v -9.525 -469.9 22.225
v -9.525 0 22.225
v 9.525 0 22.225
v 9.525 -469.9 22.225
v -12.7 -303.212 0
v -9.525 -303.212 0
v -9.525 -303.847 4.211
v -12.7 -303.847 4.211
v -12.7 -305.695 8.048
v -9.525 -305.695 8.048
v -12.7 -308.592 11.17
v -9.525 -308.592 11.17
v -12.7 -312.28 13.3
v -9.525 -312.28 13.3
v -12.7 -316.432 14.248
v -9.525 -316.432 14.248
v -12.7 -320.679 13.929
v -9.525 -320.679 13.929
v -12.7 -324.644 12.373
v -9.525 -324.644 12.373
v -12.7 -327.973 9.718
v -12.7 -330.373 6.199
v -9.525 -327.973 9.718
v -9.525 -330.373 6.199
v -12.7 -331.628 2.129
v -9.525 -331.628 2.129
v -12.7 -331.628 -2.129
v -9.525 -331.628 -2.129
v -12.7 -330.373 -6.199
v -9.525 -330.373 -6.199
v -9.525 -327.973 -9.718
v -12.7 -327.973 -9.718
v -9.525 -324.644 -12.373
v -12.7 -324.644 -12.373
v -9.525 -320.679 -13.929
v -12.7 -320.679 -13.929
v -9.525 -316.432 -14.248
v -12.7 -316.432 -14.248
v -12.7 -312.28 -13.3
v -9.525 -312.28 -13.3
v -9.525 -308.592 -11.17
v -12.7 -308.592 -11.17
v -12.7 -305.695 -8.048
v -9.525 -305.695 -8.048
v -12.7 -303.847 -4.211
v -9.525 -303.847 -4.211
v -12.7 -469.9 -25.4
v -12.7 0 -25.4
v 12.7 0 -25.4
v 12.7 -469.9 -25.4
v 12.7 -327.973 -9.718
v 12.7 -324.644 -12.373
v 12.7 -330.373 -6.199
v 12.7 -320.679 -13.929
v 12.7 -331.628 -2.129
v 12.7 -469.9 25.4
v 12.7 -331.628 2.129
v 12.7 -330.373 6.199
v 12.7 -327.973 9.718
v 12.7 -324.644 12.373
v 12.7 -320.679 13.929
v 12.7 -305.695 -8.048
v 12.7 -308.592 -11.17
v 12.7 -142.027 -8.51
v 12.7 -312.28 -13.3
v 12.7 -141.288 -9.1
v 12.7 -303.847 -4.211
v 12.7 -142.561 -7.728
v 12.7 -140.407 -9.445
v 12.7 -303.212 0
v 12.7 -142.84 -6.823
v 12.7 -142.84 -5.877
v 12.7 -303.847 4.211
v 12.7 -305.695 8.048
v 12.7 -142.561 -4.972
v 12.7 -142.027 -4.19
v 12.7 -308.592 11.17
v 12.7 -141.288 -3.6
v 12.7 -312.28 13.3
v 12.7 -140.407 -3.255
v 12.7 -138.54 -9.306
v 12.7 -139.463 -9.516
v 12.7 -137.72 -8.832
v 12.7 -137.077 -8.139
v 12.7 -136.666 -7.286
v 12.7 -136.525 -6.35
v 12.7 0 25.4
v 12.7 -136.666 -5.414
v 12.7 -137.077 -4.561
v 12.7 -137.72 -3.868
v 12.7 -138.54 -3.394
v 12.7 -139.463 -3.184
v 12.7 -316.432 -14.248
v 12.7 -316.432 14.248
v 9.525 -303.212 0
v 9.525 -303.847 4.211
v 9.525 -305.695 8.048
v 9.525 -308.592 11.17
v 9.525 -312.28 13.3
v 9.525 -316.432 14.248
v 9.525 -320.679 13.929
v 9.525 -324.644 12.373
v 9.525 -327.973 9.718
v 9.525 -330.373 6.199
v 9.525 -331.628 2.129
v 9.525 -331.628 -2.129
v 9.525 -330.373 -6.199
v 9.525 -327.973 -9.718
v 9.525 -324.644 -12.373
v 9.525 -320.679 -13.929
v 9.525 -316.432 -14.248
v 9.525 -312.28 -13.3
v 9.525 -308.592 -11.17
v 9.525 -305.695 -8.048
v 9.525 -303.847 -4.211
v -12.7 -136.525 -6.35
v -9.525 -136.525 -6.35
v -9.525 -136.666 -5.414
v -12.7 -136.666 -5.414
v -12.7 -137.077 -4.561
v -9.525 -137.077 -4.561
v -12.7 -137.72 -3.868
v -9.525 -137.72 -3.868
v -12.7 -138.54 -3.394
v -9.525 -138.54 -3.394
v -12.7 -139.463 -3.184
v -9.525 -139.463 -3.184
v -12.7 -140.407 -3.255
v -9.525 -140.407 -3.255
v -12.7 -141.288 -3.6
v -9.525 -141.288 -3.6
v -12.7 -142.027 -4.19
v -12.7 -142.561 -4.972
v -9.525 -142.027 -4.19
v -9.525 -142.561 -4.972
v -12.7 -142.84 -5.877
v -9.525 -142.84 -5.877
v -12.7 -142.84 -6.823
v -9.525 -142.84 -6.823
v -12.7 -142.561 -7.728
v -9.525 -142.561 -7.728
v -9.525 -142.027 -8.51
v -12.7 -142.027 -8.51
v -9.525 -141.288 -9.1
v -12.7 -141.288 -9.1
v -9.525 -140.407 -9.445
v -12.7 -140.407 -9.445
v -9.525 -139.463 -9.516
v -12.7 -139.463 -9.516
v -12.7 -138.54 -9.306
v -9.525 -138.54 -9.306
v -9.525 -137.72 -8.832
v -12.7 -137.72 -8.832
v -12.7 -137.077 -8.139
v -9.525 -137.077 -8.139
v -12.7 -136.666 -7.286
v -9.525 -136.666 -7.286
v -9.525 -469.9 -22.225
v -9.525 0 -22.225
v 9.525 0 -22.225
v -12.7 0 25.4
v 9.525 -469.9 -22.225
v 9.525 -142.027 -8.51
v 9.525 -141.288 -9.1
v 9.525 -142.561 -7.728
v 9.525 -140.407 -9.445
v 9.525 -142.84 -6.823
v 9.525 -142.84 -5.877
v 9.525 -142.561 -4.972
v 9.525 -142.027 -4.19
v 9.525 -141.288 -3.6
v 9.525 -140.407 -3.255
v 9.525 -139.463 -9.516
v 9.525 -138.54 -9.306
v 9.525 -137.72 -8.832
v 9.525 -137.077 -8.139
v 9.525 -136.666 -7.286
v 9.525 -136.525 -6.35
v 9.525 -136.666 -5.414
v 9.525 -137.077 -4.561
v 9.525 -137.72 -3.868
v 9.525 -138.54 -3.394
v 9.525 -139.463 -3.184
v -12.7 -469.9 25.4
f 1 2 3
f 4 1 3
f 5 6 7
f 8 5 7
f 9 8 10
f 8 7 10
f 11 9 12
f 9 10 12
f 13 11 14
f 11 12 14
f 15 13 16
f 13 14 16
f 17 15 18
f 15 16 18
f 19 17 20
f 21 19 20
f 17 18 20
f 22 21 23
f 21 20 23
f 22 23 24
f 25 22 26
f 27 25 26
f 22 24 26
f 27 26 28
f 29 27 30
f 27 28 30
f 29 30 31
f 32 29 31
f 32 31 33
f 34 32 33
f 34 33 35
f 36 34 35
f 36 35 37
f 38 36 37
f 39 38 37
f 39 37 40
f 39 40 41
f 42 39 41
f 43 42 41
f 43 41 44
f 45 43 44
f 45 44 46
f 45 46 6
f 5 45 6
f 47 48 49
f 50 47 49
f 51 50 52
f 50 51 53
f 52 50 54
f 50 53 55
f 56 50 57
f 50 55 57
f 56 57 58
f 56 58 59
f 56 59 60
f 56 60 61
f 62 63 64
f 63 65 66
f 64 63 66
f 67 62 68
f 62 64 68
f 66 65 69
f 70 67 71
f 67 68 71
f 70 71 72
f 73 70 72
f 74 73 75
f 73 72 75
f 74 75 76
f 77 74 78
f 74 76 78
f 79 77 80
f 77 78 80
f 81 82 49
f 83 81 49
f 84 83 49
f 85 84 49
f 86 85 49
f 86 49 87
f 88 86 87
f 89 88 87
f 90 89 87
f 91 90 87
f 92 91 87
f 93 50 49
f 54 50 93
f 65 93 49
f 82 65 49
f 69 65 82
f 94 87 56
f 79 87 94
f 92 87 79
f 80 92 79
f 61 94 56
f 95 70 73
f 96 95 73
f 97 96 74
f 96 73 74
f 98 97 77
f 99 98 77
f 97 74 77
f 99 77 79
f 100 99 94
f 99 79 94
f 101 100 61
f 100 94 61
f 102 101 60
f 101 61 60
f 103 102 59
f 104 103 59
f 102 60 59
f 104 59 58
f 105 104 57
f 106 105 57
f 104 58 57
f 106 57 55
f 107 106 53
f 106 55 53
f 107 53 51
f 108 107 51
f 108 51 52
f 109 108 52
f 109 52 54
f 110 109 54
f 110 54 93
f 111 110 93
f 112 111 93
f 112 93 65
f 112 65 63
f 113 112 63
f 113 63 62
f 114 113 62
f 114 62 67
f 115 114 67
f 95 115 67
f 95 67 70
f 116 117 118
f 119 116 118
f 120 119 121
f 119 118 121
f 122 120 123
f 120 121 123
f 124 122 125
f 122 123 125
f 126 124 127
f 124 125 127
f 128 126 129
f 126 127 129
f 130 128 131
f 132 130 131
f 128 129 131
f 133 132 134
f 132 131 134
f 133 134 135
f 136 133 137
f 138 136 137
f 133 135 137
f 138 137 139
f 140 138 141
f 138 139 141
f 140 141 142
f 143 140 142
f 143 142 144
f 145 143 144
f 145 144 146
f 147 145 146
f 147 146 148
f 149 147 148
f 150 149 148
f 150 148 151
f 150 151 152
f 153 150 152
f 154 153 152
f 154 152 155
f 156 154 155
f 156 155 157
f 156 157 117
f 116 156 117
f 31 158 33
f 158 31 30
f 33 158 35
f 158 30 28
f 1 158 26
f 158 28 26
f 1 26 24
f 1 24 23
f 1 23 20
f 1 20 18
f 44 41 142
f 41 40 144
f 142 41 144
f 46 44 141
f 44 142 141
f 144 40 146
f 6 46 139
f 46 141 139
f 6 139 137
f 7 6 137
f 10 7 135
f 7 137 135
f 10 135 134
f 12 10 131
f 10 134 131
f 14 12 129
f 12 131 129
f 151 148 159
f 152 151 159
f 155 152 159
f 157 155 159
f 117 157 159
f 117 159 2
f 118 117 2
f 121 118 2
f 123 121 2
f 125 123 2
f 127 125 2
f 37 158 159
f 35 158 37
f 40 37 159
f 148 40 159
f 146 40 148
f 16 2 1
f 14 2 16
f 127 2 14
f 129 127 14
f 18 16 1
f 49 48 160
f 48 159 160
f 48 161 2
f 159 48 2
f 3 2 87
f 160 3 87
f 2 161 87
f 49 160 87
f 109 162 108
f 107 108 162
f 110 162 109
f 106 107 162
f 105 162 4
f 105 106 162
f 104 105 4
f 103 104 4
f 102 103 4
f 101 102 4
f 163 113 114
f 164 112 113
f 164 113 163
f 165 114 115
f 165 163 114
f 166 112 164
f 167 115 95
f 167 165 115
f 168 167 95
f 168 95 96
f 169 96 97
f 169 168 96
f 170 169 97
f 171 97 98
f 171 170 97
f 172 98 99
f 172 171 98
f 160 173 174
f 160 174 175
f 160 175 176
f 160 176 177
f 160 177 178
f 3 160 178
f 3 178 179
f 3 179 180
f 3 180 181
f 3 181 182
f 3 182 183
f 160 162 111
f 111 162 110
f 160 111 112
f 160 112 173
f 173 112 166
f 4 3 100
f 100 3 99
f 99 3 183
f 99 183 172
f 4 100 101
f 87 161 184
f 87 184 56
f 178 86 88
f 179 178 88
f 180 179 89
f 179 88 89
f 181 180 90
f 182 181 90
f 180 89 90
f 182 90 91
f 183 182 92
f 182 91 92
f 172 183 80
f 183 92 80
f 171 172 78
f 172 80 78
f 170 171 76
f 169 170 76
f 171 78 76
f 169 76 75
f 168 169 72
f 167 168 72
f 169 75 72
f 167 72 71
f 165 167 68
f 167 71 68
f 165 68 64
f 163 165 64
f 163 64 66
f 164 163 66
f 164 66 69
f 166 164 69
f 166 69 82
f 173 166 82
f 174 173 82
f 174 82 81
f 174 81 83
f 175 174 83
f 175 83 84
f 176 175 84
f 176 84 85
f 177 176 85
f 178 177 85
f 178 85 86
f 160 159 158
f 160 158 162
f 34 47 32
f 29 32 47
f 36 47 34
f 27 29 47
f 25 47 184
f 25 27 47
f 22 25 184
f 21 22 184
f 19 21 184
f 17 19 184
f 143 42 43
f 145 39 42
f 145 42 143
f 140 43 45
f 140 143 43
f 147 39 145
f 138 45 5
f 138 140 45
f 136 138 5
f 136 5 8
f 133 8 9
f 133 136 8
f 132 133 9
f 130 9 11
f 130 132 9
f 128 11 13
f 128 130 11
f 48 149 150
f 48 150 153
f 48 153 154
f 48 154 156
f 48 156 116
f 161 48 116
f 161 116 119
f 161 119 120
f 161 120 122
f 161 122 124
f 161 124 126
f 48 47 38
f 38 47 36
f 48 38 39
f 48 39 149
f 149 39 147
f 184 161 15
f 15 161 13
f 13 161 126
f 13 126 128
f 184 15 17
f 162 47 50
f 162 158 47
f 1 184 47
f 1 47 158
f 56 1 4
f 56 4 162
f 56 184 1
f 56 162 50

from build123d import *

# Parameters (mm, degrees)
F0_W     = 25.4
F0_H     = 50.8
F0_W_2   = 19.05
F0_H_2   = 44.45
F1_DEPTH = 469.9
F2_R     = 14.2875
F2_R_2   = 3.175
F3_DEPTH = 25.4


with BuildPart() as f1:
    # F0 (on Front) → F1 (new body)
    with BuildSketch(Plane.XZ):
        Rectangle(F0_W, F0_H)
        Rectangle(F0_W_2, F0_H_2, mode=Mode.SUBTRACT)
    extrude(amount=F1_DEPTH)

    # F2 (on face) → F3 (cut)
    with BuildSketch(Plane.YZ.offset(12.7)):
        with Locations((-317.5, 0)):
            Circle(F2_R)
        with Locations((-139.7, -6.35)):
            Circle(F2_R_2)
    extrude(amount=-F3_DEPTH, mode=Mode.SUBTRACT)


solid = f1.part
